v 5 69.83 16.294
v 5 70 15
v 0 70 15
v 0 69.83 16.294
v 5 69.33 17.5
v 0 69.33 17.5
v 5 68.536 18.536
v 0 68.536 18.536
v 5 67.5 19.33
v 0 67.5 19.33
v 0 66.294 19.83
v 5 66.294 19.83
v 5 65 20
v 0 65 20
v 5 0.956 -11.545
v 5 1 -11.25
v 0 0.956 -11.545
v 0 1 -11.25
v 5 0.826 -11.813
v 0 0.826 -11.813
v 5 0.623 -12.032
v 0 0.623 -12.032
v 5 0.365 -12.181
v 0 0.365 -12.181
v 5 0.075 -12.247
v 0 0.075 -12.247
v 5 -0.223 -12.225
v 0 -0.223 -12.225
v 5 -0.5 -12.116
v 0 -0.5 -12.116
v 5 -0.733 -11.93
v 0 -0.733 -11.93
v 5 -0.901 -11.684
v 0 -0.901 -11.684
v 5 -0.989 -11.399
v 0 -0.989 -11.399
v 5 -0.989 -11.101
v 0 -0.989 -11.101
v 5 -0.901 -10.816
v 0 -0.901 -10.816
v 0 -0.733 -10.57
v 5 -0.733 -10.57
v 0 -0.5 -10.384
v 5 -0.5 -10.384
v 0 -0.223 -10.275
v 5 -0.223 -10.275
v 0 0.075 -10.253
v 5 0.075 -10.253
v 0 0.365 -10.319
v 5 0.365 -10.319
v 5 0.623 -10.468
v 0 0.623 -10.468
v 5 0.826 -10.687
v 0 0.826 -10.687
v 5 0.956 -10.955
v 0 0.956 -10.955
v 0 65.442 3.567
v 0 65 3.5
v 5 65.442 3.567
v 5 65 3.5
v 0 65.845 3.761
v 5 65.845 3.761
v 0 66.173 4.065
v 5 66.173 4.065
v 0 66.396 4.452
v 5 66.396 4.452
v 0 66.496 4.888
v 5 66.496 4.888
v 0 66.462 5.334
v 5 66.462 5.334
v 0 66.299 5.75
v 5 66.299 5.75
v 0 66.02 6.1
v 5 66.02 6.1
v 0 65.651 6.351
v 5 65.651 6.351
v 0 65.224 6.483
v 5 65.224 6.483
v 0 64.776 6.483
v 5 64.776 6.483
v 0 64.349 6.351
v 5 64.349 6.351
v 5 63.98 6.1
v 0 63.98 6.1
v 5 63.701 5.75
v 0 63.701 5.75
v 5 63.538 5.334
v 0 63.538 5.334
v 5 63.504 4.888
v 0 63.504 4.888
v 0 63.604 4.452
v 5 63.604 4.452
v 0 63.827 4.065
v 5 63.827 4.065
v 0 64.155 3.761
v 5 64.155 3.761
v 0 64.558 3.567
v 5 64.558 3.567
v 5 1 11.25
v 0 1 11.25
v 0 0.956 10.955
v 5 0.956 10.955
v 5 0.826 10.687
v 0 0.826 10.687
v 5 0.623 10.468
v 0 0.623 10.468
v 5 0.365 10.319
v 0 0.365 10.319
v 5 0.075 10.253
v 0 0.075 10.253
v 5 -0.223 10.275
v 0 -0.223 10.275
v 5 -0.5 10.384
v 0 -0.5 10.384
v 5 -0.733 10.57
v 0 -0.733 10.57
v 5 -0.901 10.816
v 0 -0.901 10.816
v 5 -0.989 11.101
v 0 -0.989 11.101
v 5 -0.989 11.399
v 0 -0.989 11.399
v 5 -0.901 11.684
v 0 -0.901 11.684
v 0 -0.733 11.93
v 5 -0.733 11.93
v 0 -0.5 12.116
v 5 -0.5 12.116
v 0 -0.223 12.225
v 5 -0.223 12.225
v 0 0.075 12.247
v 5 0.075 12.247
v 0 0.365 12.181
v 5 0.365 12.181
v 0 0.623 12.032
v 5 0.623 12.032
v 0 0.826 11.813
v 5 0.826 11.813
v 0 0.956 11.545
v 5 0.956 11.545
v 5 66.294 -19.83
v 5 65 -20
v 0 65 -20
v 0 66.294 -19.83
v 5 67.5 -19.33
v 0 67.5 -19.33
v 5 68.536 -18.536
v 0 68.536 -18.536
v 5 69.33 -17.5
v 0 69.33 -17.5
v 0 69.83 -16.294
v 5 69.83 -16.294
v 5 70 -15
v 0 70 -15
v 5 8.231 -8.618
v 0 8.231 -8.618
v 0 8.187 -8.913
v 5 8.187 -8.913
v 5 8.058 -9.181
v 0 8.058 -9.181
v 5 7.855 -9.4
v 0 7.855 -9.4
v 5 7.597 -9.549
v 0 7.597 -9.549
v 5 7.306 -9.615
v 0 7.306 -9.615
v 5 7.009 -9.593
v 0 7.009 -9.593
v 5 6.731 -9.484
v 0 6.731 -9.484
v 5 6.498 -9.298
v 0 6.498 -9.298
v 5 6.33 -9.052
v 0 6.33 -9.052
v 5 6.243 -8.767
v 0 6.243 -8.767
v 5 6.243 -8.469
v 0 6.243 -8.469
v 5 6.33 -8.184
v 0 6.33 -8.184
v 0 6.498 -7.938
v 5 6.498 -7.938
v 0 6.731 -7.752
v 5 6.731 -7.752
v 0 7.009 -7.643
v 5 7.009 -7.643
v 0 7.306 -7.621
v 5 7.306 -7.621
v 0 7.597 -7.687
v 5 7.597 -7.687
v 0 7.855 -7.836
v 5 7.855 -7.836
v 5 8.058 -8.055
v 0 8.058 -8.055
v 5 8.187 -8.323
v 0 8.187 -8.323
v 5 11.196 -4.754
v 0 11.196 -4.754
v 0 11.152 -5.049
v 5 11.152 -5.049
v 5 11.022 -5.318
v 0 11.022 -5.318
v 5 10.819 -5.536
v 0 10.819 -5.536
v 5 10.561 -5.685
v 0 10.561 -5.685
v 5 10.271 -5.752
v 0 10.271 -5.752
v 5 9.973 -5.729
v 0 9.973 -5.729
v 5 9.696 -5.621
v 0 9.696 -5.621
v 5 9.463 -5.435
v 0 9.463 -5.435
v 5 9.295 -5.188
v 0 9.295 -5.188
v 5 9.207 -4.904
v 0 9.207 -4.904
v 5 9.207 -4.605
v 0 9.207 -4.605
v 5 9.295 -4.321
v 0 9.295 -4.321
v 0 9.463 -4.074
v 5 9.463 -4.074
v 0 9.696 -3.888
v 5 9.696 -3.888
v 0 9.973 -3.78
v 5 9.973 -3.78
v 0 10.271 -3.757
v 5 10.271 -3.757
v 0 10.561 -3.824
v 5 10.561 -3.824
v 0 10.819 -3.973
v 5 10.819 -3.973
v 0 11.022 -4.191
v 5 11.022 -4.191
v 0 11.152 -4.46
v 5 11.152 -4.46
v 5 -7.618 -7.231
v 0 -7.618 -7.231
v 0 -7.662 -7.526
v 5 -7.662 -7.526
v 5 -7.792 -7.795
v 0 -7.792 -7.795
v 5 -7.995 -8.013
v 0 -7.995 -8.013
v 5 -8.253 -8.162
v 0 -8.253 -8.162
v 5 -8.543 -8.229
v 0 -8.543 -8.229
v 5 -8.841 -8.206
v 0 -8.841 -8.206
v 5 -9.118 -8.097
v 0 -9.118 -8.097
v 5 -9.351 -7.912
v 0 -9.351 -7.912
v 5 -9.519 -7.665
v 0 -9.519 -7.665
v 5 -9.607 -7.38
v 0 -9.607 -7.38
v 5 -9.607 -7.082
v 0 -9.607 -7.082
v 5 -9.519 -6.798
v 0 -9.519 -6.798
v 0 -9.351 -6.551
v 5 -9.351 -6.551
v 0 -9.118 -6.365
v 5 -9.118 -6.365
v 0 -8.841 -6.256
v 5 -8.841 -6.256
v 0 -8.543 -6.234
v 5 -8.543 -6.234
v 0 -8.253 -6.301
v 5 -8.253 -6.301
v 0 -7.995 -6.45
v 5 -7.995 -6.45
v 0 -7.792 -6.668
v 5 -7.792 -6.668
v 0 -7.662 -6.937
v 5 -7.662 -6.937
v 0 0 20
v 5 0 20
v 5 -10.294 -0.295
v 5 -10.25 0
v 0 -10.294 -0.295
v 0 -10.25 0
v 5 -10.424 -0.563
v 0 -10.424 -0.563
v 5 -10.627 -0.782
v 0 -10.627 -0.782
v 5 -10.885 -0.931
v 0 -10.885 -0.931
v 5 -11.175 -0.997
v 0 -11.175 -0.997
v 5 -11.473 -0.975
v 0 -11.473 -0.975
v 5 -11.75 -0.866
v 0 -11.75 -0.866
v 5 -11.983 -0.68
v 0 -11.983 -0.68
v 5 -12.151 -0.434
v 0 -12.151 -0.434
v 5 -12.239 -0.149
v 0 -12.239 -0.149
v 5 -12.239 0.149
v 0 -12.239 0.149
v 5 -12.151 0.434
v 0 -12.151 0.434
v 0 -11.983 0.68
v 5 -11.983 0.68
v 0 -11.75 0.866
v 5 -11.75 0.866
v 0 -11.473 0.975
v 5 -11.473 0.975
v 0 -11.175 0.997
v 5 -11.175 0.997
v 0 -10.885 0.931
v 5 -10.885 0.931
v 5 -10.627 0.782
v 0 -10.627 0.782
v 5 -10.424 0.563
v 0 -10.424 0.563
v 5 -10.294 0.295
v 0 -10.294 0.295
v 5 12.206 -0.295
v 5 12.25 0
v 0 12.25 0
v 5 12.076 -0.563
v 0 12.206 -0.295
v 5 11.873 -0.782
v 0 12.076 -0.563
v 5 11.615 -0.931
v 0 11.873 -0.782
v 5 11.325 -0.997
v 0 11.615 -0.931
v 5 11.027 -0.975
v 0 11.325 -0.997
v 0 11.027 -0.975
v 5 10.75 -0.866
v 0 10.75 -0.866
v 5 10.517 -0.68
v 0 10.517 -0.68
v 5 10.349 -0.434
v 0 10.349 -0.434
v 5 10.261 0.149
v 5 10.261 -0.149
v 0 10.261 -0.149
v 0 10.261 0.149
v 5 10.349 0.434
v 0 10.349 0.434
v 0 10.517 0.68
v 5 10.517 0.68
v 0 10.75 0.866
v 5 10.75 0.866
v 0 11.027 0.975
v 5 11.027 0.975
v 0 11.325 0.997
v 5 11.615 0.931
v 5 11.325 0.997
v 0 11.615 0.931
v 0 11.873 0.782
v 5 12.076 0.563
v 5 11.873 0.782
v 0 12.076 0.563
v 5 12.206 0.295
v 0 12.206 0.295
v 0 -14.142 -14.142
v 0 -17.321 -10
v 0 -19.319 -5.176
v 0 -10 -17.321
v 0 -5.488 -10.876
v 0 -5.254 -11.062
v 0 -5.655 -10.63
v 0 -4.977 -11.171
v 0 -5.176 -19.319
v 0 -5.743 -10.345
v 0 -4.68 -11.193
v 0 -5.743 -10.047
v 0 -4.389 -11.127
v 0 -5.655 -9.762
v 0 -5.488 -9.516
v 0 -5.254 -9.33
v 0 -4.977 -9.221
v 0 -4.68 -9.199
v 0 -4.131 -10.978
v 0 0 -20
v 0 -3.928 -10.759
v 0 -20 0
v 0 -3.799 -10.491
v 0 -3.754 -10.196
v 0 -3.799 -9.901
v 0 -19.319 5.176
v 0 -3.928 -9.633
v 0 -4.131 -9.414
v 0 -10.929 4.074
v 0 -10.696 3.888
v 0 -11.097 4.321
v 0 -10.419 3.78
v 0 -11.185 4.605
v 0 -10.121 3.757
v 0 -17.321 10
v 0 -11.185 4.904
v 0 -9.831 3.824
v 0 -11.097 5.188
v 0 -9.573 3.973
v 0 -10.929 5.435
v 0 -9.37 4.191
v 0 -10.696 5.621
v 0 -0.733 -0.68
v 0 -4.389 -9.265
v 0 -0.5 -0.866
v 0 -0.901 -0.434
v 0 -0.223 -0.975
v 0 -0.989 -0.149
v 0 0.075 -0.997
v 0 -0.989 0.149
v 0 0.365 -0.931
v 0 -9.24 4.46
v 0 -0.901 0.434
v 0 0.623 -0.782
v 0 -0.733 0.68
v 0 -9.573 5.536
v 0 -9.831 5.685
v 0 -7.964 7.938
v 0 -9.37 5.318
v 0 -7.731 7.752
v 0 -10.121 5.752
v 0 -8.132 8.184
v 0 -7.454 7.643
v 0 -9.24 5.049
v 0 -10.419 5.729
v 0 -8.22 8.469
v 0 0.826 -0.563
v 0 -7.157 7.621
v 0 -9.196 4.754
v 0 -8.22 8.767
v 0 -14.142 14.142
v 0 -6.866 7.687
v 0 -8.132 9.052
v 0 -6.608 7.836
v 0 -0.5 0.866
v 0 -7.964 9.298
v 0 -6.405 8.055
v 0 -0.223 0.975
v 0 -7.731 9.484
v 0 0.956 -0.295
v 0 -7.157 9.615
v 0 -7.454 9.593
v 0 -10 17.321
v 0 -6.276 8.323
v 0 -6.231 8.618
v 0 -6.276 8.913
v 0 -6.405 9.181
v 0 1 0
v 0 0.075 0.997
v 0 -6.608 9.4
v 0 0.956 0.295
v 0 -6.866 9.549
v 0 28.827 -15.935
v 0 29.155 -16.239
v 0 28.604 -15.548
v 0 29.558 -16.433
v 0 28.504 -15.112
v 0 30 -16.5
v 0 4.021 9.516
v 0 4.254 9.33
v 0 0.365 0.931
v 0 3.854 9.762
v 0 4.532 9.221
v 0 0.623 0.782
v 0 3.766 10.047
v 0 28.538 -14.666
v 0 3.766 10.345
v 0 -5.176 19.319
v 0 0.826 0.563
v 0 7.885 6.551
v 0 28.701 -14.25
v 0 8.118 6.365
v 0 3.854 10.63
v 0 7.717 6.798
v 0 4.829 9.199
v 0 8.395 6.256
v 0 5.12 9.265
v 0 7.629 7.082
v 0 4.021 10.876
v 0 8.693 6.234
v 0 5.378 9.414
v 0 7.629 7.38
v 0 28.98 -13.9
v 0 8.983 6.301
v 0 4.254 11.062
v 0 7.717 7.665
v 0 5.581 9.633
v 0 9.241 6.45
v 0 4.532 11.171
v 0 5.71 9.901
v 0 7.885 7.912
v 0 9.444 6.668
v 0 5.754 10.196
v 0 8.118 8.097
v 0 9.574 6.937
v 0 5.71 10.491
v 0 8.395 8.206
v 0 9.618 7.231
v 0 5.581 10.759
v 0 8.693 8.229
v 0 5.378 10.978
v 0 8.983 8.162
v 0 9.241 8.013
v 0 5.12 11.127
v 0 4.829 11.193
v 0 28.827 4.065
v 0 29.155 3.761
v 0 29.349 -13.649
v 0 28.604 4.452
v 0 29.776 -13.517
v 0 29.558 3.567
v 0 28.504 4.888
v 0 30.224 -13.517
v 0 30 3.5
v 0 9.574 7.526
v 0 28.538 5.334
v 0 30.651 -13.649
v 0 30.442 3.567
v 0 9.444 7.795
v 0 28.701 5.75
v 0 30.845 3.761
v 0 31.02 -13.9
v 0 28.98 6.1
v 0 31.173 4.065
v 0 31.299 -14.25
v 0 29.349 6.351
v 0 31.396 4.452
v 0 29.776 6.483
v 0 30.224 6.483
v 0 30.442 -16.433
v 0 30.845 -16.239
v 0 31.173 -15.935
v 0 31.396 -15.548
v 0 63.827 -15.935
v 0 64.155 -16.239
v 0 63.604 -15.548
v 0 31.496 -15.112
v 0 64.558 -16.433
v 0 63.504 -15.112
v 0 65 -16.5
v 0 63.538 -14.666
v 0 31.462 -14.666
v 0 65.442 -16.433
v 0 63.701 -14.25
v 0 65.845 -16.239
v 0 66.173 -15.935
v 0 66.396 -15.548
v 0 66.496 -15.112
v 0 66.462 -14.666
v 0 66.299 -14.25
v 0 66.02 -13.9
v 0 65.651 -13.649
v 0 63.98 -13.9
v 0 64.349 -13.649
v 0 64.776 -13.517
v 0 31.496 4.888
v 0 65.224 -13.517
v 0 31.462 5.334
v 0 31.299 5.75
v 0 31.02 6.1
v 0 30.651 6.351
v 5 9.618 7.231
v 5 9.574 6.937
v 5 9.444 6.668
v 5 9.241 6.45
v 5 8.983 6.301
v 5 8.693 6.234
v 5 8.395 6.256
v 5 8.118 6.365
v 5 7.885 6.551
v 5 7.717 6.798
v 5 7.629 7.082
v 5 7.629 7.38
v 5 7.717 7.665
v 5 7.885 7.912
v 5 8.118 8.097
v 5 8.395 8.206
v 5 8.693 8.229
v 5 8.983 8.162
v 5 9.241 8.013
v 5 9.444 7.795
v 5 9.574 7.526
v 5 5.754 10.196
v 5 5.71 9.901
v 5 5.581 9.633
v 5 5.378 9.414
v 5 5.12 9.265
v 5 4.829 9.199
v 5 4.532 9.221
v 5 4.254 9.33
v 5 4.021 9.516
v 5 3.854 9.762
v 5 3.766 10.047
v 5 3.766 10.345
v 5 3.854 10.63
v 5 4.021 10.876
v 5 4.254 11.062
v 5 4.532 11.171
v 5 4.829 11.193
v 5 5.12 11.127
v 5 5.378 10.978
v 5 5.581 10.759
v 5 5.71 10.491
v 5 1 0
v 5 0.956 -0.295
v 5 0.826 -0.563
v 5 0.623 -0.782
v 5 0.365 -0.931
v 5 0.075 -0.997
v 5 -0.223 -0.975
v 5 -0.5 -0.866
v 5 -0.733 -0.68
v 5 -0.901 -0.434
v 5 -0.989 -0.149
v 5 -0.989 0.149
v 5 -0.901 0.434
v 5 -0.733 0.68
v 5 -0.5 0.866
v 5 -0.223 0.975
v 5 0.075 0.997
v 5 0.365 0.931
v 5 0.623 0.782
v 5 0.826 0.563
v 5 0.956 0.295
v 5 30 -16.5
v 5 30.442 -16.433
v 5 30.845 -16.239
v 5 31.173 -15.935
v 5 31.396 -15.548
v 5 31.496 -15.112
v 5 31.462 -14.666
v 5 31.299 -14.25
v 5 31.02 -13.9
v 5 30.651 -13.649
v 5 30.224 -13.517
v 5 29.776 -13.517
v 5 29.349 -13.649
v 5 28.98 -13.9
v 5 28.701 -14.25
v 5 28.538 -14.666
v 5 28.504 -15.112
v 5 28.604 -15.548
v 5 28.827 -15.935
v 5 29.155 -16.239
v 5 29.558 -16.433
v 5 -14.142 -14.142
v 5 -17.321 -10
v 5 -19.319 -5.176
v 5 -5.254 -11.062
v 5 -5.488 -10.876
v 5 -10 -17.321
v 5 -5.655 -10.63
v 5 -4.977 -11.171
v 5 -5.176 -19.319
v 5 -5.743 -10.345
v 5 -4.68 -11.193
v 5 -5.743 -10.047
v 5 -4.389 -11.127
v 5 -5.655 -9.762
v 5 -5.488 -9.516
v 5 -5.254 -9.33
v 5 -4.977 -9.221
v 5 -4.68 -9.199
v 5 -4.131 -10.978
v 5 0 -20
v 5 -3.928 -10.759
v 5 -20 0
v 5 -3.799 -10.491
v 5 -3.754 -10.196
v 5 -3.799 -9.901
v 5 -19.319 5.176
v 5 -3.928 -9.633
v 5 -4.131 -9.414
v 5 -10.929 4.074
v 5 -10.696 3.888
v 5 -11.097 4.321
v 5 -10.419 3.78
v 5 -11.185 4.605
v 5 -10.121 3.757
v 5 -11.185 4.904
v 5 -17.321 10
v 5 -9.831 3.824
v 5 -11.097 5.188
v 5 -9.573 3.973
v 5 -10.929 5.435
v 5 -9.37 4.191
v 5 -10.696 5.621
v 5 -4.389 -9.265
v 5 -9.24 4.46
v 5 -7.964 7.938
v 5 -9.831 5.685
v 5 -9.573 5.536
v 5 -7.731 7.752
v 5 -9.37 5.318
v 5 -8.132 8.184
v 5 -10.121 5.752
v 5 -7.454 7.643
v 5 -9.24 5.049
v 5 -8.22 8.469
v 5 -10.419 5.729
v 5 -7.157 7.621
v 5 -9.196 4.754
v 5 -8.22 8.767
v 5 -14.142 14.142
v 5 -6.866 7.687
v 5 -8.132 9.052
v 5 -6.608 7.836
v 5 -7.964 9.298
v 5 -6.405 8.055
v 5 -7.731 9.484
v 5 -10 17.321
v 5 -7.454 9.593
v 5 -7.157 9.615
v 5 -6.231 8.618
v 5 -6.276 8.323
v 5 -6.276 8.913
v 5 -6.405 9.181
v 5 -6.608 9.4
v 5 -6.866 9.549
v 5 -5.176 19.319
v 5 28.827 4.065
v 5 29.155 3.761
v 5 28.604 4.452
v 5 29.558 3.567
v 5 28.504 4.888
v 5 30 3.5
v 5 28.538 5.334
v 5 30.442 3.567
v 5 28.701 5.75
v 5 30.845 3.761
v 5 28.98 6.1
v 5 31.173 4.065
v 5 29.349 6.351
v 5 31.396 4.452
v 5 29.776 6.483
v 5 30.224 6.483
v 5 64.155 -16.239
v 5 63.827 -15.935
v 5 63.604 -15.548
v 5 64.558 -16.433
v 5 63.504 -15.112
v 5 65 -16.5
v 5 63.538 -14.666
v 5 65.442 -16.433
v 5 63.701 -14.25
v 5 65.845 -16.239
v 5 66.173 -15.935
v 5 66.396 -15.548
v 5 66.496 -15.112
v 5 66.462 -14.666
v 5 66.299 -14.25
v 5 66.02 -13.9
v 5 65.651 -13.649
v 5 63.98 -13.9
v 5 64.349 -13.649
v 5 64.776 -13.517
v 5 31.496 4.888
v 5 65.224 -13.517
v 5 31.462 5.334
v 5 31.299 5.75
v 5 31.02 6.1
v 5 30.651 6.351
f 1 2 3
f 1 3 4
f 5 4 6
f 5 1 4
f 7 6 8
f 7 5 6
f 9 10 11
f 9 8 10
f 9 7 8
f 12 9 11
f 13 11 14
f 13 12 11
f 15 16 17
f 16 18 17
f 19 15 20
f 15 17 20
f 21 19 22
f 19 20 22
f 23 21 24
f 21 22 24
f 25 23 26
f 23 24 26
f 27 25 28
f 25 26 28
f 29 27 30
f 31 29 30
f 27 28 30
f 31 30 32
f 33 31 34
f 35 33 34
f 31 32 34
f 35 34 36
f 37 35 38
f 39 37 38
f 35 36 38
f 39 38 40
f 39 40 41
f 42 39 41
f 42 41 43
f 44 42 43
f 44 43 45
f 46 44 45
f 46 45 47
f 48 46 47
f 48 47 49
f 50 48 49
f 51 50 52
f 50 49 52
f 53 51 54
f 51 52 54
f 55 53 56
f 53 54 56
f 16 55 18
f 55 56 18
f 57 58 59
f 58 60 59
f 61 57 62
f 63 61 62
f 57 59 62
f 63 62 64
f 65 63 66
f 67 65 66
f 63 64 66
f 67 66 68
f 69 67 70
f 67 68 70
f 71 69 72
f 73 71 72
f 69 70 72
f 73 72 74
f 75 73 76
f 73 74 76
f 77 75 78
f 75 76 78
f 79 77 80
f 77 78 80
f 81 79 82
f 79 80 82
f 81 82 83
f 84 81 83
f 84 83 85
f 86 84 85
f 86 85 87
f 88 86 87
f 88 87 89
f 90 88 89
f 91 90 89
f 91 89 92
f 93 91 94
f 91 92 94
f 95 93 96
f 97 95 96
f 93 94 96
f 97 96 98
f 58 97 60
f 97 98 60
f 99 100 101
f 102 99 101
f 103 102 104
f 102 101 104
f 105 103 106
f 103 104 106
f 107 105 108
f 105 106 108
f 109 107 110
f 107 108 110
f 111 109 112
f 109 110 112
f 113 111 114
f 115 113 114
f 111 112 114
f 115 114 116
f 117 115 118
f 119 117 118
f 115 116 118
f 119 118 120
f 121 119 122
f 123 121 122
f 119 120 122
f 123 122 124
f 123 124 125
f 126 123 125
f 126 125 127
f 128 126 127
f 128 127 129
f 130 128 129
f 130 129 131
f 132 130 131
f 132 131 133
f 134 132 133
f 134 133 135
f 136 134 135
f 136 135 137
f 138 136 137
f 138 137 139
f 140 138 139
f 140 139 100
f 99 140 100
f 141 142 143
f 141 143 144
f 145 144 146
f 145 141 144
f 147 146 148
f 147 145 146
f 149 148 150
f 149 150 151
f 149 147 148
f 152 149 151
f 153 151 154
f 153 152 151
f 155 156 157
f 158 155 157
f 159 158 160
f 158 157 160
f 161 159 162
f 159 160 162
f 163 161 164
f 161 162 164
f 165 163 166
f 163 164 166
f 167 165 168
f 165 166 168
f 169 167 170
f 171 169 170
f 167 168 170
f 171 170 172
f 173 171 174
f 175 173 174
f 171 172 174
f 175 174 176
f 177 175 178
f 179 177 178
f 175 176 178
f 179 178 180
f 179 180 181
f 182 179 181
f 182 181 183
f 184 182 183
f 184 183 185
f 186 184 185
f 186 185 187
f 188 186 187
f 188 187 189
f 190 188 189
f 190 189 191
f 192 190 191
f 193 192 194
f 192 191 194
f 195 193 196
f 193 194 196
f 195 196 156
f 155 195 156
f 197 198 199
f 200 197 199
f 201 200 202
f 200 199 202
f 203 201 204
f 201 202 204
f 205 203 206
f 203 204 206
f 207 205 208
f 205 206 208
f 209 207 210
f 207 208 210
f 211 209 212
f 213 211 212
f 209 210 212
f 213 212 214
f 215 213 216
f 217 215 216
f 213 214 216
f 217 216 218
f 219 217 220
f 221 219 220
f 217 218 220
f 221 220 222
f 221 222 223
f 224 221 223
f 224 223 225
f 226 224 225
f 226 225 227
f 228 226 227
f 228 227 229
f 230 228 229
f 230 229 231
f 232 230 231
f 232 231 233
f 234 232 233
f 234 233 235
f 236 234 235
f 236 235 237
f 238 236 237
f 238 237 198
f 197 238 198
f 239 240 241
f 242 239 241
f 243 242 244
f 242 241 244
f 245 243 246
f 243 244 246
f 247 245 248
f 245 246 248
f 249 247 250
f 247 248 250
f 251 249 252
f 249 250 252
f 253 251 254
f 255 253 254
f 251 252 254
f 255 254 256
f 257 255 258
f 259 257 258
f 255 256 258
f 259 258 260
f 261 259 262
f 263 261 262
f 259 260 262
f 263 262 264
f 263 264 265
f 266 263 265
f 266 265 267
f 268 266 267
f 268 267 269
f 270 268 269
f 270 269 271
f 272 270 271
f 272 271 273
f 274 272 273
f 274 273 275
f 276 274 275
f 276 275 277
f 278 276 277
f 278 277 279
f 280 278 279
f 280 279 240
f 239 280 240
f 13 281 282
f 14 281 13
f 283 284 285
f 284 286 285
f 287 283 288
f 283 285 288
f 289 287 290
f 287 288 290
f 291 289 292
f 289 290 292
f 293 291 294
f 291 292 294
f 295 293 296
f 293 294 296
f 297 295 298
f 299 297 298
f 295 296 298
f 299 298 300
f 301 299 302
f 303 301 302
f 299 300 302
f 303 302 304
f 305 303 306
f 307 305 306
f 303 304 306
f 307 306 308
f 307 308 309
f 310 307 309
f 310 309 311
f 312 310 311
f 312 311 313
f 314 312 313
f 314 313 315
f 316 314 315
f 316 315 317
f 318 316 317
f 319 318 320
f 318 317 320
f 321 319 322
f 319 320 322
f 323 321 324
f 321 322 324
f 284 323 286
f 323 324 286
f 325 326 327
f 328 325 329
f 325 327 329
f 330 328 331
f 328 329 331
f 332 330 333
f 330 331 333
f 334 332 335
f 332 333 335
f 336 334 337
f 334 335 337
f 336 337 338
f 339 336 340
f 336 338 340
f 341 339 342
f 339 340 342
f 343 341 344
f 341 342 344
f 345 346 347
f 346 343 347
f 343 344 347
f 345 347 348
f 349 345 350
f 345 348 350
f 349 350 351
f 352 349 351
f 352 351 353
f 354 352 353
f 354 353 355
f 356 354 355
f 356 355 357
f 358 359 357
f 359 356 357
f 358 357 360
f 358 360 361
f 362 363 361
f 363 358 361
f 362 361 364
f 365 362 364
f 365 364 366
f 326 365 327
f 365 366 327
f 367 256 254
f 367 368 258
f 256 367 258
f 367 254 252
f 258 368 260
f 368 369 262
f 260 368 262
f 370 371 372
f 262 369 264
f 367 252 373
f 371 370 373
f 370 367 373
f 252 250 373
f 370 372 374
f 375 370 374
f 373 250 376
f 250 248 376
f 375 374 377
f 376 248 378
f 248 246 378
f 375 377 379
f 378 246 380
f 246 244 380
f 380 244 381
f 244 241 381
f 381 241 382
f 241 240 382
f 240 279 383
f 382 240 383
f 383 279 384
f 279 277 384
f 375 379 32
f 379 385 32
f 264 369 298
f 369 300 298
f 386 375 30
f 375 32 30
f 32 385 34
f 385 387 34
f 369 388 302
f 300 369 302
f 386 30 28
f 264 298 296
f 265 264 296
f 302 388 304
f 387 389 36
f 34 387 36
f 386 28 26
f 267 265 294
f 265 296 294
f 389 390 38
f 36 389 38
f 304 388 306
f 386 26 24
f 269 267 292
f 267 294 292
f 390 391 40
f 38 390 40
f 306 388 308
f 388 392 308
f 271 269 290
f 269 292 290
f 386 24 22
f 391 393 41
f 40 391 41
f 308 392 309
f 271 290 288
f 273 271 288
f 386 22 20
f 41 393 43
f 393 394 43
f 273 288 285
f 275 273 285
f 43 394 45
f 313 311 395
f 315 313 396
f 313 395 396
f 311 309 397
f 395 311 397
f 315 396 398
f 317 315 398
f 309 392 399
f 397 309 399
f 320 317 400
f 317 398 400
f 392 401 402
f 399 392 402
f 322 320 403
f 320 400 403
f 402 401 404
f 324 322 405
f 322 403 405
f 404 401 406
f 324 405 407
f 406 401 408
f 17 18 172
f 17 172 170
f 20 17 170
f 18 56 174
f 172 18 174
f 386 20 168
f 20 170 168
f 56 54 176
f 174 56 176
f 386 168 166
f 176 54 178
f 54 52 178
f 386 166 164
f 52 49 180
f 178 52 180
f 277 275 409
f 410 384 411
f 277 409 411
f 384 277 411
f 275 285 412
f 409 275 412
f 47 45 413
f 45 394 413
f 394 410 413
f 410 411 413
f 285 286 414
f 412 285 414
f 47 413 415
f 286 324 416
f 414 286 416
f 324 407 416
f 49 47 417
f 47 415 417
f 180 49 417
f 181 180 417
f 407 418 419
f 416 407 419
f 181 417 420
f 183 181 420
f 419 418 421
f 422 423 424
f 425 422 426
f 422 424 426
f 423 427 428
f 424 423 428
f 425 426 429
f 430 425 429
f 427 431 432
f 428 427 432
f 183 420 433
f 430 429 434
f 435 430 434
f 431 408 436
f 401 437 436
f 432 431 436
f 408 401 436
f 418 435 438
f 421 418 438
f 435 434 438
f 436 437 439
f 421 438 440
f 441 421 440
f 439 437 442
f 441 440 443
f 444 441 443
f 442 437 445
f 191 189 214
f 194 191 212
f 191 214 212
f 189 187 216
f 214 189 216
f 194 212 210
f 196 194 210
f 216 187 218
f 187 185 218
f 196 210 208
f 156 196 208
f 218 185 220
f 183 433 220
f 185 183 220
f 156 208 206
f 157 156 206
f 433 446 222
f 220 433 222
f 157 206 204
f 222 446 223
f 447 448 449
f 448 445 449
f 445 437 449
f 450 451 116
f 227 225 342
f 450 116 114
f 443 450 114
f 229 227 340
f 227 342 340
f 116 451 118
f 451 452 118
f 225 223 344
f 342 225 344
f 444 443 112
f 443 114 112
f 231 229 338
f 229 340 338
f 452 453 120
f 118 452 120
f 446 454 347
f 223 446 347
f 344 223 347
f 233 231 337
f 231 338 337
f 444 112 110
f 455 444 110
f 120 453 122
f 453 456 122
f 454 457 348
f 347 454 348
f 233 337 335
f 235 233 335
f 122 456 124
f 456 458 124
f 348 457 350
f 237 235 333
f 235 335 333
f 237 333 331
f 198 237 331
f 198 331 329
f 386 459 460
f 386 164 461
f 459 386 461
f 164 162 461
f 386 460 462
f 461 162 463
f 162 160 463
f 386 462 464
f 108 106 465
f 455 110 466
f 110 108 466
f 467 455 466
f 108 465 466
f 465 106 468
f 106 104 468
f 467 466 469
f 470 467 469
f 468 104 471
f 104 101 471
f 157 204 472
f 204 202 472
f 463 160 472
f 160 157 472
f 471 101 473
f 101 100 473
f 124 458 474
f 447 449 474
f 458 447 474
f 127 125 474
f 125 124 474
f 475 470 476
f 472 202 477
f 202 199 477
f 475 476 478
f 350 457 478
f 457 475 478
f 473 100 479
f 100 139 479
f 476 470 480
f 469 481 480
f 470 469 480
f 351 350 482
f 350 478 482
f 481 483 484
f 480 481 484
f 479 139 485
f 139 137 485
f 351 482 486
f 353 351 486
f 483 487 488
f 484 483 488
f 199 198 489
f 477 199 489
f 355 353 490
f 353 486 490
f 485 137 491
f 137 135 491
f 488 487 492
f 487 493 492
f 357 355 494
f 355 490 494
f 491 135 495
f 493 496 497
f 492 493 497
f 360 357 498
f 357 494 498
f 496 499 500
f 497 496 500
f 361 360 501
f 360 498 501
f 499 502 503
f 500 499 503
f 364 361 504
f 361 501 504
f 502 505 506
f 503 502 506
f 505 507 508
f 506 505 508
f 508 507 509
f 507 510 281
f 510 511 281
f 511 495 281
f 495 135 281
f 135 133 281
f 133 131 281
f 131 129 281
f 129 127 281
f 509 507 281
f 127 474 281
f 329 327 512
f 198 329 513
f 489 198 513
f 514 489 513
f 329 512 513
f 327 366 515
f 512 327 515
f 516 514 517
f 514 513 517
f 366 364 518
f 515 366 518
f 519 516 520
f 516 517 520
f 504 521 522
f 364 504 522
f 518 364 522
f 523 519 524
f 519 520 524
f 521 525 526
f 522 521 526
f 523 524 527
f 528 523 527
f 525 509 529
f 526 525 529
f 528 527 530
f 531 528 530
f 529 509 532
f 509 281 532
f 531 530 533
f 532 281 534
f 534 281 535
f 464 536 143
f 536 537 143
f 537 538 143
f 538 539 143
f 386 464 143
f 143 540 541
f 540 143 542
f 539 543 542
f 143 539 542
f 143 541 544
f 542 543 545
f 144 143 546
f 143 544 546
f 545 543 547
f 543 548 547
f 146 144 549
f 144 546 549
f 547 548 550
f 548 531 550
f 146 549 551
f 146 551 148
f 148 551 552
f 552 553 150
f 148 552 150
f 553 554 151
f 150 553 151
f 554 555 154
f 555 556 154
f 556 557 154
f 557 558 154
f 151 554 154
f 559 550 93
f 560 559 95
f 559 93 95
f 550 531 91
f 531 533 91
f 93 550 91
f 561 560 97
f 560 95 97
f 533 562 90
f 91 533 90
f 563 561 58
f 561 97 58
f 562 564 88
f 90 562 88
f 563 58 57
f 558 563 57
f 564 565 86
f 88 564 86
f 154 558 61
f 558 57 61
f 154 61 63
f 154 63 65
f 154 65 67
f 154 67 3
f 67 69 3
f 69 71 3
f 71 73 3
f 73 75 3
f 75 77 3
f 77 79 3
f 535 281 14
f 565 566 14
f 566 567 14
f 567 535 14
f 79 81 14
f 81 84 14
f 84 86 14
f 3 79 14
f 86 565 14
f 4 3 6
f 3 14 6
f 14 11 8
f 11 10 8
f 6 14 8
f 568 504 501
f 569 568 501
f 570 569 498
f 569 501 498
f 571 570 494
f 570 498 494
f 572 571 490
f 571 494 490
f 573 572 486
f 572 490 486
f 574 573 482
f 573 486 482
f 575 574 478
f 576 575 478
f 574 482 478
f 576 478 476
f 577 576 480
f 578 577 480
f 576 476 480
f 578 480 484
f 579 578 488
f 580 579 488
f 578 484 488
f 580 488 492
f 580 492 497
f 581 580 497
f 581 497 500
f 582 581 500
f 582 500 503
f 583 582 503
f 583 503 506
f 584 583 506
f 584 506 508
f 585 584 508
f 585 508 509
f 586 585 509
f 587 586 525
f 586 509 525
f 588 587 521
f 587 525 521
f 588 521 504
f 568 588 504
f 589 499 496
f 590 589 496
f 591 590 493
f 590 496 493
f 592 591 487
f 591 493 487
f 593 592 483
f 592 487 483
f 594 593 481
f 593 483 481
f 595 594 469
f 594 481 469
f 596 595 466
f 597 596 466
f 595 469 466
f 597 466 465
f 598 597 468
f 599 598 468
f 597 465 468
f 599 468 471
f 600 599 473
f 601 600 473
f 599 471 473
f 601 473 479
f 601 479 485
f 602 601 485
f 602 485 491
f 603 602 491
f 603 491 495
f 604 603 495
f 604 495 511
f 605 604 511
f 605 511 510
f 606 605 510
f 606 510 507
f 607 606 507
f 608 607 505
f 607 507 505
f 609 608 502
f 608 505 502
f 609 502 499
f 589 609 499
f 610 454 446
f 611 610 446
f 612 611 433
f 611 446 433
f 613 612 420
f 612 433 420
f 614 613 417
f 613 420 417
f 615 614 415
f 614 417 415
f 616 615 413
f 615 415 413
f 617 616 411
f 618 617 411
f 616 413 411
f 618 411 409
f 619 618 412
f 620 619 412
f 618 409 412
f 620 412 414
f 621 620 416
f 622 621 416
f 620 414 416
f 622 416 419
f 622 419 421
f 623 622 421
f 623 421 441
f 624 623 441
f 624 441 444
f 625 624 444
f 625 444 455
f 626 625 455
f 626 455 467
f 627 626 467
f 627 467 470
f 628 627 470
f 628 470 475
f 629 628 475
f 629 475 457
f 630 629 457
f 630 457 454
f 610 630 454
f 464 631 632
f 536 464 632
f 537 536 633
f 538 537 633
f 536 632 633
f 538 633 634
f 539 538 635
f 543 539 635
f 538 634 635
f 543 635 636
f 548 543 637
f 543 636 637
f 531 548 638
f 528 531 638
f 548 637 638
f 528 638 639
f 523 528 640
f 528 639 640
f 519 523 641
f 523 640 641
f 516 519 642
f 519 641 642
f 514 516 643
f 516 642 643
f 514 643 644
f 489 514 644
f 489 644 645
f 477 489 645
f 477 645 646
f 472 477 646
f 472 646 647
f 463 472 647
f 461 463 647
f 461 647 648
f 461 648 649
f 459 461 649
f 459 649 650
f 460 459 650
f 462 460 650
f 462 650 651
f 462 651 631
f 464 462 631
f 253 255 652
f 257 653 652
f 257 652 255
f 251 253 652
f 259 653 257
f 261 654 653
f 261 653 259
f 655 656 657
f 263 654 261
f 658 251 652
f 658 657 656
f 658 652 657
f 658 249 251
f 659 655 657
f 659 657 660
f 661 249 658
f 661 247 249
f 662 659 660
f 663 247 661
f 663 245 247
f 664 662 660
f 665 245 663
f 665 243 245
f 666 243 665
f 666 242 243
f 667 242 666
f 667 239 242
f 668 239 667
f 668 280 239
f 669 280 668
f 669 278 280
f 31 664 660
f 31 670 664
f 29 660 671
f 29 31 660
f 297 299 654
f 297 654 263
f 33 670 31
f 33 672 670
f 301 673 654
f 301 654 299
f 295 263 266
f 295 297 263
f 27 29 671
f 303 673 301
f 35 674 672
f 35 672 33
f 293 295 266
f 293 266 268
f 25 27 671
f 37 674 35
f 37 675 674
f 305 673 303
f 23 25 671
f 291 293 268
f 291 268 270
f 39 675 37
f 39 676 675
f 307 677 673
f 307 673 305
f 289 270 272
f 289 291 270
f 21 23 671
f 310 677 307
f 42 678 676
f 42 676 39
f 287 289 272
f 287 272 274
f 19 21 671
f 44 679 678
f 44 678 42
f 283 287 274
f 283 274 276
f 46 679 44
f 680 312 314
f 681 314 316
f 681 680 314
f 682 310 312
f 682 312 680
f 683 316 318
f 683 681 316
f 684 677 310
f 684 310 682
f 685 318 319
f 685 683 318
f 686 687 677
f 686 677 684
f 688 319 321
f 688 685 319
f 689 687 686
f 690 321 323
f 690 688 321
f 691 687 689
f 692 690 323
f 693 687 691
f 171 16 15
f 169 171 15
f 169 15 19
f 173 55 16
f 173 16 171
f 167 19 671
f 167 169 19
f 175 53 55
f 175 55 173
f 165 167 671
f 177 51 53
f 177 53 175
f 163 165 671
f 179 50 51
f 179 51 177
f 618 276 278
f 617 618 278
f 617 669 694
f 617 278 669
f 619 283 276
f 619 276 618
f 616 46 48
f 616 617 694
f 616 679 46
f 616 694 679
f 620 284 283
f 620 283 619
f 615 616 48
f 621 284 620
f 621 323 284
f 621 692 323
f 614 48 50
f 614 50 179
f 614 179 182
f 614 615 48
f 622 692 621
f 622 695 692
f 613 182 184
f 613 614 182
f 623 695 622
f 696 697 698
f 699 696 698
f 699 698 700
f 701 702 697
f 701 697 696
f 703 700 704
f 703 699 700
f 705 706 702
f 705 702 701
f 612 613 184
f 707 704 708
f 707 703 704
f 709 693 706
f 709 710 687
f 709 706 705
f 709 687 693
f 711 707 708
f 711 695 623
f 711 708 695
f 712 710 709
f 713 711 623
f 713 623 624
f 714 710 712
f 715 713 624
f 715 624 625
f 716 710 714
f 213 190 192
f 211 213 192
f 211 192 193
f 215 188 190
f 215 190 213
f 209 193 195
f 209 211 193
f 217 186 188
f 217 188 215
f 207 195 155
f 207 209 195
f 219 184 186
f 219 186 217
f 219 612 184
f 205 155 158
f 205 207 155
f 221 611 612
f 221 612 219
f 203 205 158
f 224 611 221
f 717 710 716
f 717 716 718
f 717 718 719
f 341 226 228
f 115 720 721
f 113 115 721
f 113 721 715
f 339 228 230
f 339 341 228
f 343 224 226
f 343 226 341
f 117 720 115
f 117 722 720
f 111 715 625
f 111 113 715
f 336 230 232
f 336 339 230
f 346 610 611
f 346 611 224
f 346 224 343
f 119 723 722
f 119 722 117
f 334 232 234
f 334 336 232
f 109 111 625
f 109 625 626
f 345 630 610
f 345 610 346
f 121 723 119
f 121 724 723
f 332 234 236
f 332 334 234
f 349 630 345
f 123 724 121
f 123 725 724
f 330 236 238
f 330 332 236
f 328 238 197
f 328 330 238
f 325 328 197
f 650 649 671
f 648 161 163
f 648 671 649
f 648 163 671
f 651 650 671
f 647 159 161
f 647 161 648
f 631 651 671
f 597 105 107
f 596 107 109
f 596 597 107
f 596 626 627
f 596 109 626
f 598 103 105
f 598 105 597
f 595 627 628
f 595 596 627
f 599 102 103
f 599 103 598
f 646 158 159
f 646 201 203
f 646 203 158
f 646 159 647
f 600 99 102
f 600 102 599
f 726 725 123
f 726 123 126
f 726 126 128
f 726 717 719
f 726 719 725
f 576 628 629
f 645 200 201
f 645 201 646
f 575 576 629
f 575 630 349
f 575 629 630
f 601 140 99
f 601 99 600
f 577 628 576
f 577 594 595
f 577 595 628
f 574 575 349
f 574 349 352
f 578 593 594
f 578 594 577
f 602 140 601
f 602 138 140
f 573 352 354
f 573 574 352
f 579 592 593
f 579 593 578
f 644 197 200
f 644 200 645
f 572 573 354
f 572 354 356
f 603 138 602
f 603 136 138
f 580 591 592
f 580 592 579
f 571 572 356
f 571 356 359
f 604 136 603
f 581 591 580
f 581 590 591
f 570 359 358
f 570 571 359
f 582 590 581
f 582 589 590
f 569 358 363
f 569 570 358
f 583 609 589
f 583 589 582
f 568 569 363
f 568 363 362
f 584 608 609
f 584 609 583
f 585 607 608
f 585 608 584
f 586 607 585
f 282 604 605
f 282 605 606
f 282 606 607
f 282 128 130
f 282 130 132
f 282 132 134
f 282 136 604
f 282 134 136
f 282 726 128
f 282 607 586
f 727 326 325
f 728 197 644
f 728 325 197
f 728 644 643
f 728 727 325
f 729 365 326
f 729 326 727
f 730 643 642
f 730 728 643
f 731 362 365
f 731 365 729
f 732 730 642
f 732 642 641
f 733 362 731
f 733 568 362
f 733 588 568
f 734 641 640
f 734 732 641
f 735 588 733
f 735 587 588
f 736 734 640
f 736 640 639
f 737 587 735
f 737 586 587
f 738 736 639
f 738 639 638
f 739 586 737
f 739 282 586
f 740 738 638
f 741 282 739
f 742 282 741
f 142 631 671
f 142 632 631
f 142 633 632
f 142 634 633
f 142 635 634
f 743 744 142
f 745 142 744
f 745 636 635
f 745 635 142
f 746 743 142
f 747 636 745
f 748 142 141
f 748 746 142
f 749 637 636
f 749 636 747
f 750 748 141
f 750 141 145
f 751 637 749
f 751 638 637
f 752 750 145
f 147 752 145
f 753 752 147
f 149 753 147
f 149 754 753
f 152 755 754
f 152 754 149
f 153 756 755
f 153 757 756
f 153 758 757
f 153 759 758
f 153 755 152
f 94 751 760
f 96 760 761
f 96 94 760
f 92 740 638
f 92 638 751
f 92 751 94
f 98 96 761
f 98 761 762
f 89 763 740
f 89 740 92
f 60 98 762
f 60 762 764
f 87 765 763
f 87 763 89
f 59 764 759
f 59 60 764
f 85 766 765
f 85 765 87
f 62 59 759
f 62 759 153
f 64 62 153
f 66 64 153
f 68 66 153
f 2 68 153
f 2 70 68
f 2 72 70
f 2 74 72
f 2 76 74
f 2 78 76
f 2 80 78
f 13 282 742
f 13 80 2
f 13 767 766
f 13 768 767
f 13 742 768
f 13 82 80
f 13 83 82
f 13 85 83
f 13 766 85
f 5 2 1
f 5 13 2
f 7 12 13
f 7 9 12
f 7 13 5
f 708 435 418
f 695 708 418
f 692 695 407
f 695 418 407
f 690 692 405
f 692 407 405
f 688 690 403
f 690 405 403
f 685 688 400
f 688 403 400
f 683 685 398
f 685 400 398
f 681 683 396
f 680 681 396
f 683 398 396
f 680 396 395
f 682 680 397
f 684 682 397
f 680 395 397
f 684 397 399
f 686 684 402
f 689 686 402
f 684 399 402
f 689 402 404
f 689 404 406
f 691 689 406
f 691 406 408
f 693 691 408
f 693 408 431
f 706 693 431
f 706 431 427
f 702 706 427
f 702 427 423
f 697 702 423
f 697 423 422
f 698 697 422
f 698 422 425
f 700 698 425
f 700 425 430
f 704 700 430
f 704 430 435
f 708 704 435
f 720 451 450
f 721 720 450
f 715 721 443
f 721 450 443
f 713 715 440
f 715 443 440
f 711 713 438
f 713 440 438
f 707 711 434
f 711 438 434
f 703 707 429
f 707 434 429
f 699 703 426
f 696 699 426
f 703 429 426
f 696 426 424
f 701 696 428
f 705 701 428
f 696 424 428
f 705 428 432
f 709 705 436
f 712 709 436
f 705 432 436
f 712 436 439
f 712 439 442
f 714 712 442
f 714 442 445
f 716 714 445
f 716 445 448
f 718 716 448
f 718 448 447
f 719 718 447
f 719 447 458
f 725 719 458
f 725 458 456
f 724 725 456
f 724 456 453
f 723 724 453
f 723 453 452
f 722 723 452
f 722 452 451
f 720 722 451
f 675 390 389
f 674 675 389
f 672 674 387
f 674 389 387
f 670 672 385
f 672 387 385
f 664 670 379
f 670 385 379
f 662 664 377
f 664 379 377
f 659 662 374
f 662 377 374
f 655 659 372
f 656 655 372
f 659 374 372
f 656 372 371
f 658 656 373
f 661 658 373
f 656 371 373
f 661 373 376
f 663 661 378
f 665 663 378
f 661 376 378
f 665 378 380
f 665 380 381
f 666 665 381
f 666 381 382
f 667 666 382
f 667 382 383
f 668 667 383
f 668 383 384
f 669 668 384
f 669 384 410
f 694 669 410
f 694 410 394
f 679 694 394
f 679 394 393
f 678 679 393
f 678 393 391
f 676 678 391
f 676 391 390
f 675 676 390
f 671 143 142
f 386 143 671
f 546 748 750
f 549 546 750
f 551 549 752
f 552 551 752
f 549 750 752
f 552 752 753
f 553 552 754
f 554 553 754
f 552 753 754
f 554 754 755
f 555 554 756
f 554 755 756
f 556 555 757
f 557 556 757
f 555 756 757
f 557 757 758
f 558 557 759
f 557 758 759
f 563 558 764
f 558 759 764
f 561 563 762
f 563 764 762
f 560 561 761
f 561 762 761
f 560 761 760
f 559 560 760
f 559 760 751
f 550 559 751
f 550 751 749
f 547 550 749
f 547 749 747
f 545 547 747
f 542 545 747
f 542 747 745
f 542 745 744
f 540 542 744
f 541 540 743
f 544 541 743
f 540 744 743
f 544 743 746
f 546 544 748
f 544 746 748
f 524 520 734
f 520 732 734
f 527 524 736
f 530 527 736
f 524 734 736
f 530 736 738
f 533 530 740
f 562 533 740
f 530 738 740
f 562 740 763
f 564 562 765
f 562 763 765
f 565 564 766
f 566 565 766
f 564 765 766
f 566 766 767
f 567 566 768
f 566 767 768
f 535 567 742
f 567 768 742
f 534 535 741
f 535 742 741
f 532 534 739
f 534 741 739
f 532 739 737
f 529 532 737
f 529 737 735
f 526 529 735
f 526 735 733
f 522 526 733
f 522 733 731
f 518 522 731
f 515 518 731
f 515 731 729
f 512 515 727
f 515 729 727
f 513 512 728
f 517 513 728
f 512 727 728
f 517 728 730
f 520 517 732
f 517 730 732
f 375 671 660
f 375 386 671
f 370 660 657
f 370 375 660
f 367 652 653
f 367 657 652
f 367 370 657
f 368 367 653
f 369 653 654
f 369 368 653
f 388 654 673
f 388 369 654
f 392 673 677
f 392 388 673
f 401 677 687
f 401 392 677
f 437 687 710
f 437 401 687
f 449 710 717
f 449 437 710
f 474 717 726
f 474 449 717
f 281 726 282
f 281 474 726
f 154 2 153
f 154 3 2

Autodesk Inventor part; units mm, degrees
ref_plane "YZ Plane" through (0, 0, 0) normal (1, 0, 0) x (0, 1, 0)
ref_plane "XZ Plane" through (0, 0, 0) normal (0, 1, 0) x (-1, 0, 0)
ref_plane "XY Plane" through (0, 0, 0) normal (0, 0, 1) x (1, 0, 0)
sketch "Sketch2" plane through (0, 0, 0) normal (1, 0, 0) x (0, 1, 0)
  circle A0 centre (0, 0) radius 11.25
  circle A1 centre (11.25, 0) radius 1
  circle A2 centre (0, 11.25) radius 1
  circle A3 centre (-11.25, 0) radius 1
  circle A4 centre (0, -11.25) radius 1
  circle A5 centre (7.2314, -8.618) radius 1
  line L0 (0, 0) -> (7.2314, -8.618)
  line L1 (0, 0) -> (11.25, 0)
  circle A6 centre (8.618, 7.2314) radius 1
  circle A7 centre (-7.2314, 8.618) radius 1
  circle A8 centre (-8.618, -7.2314) radius 1
  circle A9 centre (10.196, -4.7545) radius 1
  line L2 (0, 0) -> (10.196, -4.7545)
  circle A10 centre (4.7545, 10.196) radius 1
  circle A11 centre (-10.196, 4.7545) radius 1
  circle A12 centre (-4.7545, -10.196) radius 1
  circle A13 centre (0, 0) radius 20
  line L3 (0, 20) -> (70, 20)
  line L4 (70, 20) -> (70, -20)
  line L5 (70, -20) -> (0, -20)
  line L6 (0, -20) -> (0, 20)
  line L7 (70, 20) -> (0, 20)
  line L8 (0, 20) -> (0, 15)
  line L9 (0, 15) -> (70, 15)
  line L10 (70, 15) -> (70, 20)
  circle A14 centre (0, 0) radius 1
  point P0 (13.2288, 15)
  dimension "d0" = 22.5
  dimension "d1" = 2
  dimension "d4" = 360
  dimension "d6" = 2
  dimension "d7" = 50
  dimension "d10" = 360
  dimension "d12" = 2
  dimension "d13" = 25
  dimension "d16" = 360
  dimension "d18" = 40
  dimension "d19" = 70
  dimension "d20" = 5
  dimension "d21" = 2
extrude "Extrusion1" add sketch "Sketch2" along normal blind 5 contours A1 L1 A14 L6 A2 A0 A10 A6 | A0 A6 A10 A2 L6 L9 A13 A4 A5 A9 A1 | A0 A9 L2 A14 L1 A1 | A9 A0 A5 L0 A14 L2 | A14 L6 A4 A0 A12 A8 A3 A11 A7 A2 | L0 A5 A0 A4 L6 A14 | A0 A7 A11 A3 A8 A12 A4 L6 A13 A2 | L6 A13 L9 | A13 L9 L4 L5 | L3 L4 L9 A13
sketch "Sketch3" plane through (5, 0, 0) normal (1, 0, 0) x (0, 0, -1)
  circle A0 centre (-5, 65) radius 1.5
  line L0 (20, 70) -> (-20, 70) projected
  line L1 (-20, 70) -> (-20, 0) projected
  circle A1 centre (15, 65) radius 1.5
  circle A2 centre (-5, 30) radius 1.5
  circle A3 centre (15, 30) radius 1.5
  point P0 (0, 0)
  dimension "d24" = 5
  dimension "d25" = 15
  dimension "d26" = 3
  dimension "d29" = 20
  dimension "d32" = 35
extrude "Extrusion2" cut sketch "Sketch3" against normal blind 5
fillet "Fillet1" radius 5 2 edges at (2.5, 70, 20) (2.5, 70, -20)
properties part number "StereoVisionHolder_2"
